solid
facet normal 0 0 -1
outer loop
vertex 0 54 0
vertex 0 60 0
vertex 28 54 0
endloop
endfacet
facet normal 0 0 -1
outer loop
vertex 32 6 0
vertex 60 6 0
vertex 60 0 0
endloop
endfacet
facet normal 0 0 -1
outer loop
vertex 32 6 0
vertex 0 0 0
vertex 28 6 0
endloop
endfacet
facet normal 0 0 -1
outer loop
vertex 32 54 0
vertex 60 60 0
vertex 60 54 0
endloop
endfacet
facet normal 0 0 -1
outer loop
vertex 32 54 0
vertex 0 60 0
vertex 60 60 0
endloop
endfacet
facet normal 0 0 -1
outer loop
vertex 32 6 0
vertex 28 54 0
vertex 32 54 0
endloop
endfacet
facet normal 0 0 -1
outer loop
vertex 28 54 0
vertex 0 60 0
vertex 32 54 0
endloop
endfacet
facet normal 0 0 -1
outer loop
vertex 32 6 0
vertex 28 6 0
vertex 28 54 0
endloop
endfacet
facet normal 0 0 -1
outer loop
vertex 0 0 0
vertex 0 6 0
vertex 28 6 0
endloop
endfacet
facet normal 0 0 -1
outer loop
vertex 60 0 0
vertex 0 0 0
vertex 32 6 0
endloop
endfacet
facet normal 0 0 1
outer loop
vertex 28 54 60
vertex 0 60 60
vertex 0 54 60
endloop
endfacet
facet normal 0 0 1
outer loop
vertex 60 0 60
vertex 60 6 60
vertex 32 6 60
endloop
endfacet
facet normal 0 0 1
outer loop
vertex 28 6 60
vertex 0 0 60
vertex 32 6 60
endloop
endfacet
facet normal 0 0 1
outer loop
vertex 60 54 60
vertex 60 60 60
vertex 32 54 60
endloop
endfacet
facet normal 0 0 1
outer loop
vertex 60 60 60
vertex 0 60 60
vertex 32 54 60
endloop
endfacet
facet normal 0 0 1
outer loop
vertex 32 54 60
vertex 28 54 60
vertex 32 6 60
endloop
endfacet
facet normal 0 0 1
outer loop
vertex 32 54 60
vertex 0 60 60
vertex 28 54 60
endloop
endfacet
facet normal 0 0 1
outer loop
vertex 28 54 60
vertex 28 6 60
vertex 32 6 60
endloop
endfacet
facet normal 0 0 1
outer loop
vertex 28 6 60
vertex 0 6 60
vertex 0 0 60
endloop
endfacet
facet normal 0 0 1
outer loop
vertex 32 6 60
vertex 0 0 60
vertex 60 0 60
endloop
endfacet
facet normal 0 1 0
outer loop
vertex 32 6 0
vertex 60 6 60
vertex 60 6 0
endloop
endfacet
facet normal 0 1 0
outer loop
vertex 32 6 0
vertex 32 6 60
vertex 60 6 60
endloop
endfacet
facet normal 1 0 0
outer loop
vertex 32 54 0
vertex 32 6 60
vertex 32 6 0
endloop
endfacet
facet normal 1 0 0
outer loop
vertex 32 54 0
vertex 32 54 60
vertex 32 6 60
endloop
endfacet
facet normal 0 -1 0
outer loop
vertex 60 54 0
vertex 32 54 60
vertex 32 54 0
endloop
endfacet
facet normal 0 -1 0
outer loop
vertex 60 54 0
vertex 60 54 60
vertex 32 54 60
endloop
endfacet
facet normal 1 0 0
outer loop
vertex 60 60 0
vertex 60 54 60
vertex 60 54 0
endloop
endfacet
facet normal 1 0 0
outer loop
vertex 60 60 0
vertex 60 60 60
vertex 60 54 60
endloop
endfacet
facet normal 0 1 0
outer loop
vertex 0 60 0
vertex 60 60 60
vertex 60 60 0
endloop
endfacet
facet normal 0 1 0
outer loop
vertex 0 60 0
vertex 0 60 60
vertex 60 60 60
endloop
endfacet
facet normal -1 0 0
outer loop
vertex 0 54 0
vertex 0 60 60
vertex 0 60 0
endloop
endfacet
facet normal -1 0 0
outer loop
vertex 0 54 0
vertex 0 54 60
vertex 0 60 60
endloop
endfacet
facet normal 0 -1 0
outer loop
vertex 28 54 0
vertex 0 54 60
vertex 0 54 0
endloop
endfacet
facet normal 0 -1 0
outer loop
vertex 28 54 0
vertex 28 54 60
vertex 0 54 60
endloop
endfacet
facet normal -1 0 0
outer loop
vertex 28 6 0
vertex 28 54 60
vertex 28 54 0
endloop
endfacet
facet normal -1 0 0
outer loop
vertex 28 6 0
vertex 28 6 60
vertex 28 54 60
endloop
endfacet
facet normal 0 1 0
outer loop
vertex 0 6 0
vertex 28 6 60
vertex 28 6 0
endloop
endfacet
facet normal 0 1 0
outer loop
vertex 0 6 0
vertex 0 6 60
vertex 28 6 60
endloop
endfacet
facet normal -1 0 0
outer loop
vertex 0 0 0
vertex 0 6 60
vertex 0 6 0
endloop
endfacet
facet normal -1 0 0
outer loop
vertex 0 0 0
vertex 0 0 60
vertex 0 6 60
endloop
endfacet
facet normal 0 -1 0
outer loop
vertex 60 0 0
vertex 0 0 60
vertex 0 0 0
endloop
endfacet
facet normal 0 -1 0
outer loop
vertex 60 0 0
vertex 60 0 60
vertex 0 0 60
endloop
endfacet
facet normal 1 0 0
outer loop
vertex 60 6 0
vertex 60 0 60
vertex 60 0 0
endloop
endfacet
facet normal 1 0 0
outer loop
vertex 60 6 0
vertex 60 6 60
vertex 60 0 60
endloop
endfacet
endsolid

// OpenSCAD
$fn = 32;

// ----------------------------------------------------------------------
// Structural section: ibeam 60 x 60 mm
// ----------------------------------------------------------------------

// --- parameters (mm) ---
sec_w = 60;               // section width, X
sec_h = 60;               // section height, Y
flange_t = 6;             // flange thickness
web_t = 4;                // web thickness
plate_t = 60;             // cut length, Z (extrusion height)

profile = [[0, 0], [60, 0], [60, 6], [32, 6], [32, 54], [60, 54], [60, 60], [0, 60], [0, 54], [28, 54], [28, 6], [0, 6]];  // primary outline, 12 points, counter clockwise

// --- the one profile operation ---
linear_extrude(height = plate_t) polygon(points = profile);
